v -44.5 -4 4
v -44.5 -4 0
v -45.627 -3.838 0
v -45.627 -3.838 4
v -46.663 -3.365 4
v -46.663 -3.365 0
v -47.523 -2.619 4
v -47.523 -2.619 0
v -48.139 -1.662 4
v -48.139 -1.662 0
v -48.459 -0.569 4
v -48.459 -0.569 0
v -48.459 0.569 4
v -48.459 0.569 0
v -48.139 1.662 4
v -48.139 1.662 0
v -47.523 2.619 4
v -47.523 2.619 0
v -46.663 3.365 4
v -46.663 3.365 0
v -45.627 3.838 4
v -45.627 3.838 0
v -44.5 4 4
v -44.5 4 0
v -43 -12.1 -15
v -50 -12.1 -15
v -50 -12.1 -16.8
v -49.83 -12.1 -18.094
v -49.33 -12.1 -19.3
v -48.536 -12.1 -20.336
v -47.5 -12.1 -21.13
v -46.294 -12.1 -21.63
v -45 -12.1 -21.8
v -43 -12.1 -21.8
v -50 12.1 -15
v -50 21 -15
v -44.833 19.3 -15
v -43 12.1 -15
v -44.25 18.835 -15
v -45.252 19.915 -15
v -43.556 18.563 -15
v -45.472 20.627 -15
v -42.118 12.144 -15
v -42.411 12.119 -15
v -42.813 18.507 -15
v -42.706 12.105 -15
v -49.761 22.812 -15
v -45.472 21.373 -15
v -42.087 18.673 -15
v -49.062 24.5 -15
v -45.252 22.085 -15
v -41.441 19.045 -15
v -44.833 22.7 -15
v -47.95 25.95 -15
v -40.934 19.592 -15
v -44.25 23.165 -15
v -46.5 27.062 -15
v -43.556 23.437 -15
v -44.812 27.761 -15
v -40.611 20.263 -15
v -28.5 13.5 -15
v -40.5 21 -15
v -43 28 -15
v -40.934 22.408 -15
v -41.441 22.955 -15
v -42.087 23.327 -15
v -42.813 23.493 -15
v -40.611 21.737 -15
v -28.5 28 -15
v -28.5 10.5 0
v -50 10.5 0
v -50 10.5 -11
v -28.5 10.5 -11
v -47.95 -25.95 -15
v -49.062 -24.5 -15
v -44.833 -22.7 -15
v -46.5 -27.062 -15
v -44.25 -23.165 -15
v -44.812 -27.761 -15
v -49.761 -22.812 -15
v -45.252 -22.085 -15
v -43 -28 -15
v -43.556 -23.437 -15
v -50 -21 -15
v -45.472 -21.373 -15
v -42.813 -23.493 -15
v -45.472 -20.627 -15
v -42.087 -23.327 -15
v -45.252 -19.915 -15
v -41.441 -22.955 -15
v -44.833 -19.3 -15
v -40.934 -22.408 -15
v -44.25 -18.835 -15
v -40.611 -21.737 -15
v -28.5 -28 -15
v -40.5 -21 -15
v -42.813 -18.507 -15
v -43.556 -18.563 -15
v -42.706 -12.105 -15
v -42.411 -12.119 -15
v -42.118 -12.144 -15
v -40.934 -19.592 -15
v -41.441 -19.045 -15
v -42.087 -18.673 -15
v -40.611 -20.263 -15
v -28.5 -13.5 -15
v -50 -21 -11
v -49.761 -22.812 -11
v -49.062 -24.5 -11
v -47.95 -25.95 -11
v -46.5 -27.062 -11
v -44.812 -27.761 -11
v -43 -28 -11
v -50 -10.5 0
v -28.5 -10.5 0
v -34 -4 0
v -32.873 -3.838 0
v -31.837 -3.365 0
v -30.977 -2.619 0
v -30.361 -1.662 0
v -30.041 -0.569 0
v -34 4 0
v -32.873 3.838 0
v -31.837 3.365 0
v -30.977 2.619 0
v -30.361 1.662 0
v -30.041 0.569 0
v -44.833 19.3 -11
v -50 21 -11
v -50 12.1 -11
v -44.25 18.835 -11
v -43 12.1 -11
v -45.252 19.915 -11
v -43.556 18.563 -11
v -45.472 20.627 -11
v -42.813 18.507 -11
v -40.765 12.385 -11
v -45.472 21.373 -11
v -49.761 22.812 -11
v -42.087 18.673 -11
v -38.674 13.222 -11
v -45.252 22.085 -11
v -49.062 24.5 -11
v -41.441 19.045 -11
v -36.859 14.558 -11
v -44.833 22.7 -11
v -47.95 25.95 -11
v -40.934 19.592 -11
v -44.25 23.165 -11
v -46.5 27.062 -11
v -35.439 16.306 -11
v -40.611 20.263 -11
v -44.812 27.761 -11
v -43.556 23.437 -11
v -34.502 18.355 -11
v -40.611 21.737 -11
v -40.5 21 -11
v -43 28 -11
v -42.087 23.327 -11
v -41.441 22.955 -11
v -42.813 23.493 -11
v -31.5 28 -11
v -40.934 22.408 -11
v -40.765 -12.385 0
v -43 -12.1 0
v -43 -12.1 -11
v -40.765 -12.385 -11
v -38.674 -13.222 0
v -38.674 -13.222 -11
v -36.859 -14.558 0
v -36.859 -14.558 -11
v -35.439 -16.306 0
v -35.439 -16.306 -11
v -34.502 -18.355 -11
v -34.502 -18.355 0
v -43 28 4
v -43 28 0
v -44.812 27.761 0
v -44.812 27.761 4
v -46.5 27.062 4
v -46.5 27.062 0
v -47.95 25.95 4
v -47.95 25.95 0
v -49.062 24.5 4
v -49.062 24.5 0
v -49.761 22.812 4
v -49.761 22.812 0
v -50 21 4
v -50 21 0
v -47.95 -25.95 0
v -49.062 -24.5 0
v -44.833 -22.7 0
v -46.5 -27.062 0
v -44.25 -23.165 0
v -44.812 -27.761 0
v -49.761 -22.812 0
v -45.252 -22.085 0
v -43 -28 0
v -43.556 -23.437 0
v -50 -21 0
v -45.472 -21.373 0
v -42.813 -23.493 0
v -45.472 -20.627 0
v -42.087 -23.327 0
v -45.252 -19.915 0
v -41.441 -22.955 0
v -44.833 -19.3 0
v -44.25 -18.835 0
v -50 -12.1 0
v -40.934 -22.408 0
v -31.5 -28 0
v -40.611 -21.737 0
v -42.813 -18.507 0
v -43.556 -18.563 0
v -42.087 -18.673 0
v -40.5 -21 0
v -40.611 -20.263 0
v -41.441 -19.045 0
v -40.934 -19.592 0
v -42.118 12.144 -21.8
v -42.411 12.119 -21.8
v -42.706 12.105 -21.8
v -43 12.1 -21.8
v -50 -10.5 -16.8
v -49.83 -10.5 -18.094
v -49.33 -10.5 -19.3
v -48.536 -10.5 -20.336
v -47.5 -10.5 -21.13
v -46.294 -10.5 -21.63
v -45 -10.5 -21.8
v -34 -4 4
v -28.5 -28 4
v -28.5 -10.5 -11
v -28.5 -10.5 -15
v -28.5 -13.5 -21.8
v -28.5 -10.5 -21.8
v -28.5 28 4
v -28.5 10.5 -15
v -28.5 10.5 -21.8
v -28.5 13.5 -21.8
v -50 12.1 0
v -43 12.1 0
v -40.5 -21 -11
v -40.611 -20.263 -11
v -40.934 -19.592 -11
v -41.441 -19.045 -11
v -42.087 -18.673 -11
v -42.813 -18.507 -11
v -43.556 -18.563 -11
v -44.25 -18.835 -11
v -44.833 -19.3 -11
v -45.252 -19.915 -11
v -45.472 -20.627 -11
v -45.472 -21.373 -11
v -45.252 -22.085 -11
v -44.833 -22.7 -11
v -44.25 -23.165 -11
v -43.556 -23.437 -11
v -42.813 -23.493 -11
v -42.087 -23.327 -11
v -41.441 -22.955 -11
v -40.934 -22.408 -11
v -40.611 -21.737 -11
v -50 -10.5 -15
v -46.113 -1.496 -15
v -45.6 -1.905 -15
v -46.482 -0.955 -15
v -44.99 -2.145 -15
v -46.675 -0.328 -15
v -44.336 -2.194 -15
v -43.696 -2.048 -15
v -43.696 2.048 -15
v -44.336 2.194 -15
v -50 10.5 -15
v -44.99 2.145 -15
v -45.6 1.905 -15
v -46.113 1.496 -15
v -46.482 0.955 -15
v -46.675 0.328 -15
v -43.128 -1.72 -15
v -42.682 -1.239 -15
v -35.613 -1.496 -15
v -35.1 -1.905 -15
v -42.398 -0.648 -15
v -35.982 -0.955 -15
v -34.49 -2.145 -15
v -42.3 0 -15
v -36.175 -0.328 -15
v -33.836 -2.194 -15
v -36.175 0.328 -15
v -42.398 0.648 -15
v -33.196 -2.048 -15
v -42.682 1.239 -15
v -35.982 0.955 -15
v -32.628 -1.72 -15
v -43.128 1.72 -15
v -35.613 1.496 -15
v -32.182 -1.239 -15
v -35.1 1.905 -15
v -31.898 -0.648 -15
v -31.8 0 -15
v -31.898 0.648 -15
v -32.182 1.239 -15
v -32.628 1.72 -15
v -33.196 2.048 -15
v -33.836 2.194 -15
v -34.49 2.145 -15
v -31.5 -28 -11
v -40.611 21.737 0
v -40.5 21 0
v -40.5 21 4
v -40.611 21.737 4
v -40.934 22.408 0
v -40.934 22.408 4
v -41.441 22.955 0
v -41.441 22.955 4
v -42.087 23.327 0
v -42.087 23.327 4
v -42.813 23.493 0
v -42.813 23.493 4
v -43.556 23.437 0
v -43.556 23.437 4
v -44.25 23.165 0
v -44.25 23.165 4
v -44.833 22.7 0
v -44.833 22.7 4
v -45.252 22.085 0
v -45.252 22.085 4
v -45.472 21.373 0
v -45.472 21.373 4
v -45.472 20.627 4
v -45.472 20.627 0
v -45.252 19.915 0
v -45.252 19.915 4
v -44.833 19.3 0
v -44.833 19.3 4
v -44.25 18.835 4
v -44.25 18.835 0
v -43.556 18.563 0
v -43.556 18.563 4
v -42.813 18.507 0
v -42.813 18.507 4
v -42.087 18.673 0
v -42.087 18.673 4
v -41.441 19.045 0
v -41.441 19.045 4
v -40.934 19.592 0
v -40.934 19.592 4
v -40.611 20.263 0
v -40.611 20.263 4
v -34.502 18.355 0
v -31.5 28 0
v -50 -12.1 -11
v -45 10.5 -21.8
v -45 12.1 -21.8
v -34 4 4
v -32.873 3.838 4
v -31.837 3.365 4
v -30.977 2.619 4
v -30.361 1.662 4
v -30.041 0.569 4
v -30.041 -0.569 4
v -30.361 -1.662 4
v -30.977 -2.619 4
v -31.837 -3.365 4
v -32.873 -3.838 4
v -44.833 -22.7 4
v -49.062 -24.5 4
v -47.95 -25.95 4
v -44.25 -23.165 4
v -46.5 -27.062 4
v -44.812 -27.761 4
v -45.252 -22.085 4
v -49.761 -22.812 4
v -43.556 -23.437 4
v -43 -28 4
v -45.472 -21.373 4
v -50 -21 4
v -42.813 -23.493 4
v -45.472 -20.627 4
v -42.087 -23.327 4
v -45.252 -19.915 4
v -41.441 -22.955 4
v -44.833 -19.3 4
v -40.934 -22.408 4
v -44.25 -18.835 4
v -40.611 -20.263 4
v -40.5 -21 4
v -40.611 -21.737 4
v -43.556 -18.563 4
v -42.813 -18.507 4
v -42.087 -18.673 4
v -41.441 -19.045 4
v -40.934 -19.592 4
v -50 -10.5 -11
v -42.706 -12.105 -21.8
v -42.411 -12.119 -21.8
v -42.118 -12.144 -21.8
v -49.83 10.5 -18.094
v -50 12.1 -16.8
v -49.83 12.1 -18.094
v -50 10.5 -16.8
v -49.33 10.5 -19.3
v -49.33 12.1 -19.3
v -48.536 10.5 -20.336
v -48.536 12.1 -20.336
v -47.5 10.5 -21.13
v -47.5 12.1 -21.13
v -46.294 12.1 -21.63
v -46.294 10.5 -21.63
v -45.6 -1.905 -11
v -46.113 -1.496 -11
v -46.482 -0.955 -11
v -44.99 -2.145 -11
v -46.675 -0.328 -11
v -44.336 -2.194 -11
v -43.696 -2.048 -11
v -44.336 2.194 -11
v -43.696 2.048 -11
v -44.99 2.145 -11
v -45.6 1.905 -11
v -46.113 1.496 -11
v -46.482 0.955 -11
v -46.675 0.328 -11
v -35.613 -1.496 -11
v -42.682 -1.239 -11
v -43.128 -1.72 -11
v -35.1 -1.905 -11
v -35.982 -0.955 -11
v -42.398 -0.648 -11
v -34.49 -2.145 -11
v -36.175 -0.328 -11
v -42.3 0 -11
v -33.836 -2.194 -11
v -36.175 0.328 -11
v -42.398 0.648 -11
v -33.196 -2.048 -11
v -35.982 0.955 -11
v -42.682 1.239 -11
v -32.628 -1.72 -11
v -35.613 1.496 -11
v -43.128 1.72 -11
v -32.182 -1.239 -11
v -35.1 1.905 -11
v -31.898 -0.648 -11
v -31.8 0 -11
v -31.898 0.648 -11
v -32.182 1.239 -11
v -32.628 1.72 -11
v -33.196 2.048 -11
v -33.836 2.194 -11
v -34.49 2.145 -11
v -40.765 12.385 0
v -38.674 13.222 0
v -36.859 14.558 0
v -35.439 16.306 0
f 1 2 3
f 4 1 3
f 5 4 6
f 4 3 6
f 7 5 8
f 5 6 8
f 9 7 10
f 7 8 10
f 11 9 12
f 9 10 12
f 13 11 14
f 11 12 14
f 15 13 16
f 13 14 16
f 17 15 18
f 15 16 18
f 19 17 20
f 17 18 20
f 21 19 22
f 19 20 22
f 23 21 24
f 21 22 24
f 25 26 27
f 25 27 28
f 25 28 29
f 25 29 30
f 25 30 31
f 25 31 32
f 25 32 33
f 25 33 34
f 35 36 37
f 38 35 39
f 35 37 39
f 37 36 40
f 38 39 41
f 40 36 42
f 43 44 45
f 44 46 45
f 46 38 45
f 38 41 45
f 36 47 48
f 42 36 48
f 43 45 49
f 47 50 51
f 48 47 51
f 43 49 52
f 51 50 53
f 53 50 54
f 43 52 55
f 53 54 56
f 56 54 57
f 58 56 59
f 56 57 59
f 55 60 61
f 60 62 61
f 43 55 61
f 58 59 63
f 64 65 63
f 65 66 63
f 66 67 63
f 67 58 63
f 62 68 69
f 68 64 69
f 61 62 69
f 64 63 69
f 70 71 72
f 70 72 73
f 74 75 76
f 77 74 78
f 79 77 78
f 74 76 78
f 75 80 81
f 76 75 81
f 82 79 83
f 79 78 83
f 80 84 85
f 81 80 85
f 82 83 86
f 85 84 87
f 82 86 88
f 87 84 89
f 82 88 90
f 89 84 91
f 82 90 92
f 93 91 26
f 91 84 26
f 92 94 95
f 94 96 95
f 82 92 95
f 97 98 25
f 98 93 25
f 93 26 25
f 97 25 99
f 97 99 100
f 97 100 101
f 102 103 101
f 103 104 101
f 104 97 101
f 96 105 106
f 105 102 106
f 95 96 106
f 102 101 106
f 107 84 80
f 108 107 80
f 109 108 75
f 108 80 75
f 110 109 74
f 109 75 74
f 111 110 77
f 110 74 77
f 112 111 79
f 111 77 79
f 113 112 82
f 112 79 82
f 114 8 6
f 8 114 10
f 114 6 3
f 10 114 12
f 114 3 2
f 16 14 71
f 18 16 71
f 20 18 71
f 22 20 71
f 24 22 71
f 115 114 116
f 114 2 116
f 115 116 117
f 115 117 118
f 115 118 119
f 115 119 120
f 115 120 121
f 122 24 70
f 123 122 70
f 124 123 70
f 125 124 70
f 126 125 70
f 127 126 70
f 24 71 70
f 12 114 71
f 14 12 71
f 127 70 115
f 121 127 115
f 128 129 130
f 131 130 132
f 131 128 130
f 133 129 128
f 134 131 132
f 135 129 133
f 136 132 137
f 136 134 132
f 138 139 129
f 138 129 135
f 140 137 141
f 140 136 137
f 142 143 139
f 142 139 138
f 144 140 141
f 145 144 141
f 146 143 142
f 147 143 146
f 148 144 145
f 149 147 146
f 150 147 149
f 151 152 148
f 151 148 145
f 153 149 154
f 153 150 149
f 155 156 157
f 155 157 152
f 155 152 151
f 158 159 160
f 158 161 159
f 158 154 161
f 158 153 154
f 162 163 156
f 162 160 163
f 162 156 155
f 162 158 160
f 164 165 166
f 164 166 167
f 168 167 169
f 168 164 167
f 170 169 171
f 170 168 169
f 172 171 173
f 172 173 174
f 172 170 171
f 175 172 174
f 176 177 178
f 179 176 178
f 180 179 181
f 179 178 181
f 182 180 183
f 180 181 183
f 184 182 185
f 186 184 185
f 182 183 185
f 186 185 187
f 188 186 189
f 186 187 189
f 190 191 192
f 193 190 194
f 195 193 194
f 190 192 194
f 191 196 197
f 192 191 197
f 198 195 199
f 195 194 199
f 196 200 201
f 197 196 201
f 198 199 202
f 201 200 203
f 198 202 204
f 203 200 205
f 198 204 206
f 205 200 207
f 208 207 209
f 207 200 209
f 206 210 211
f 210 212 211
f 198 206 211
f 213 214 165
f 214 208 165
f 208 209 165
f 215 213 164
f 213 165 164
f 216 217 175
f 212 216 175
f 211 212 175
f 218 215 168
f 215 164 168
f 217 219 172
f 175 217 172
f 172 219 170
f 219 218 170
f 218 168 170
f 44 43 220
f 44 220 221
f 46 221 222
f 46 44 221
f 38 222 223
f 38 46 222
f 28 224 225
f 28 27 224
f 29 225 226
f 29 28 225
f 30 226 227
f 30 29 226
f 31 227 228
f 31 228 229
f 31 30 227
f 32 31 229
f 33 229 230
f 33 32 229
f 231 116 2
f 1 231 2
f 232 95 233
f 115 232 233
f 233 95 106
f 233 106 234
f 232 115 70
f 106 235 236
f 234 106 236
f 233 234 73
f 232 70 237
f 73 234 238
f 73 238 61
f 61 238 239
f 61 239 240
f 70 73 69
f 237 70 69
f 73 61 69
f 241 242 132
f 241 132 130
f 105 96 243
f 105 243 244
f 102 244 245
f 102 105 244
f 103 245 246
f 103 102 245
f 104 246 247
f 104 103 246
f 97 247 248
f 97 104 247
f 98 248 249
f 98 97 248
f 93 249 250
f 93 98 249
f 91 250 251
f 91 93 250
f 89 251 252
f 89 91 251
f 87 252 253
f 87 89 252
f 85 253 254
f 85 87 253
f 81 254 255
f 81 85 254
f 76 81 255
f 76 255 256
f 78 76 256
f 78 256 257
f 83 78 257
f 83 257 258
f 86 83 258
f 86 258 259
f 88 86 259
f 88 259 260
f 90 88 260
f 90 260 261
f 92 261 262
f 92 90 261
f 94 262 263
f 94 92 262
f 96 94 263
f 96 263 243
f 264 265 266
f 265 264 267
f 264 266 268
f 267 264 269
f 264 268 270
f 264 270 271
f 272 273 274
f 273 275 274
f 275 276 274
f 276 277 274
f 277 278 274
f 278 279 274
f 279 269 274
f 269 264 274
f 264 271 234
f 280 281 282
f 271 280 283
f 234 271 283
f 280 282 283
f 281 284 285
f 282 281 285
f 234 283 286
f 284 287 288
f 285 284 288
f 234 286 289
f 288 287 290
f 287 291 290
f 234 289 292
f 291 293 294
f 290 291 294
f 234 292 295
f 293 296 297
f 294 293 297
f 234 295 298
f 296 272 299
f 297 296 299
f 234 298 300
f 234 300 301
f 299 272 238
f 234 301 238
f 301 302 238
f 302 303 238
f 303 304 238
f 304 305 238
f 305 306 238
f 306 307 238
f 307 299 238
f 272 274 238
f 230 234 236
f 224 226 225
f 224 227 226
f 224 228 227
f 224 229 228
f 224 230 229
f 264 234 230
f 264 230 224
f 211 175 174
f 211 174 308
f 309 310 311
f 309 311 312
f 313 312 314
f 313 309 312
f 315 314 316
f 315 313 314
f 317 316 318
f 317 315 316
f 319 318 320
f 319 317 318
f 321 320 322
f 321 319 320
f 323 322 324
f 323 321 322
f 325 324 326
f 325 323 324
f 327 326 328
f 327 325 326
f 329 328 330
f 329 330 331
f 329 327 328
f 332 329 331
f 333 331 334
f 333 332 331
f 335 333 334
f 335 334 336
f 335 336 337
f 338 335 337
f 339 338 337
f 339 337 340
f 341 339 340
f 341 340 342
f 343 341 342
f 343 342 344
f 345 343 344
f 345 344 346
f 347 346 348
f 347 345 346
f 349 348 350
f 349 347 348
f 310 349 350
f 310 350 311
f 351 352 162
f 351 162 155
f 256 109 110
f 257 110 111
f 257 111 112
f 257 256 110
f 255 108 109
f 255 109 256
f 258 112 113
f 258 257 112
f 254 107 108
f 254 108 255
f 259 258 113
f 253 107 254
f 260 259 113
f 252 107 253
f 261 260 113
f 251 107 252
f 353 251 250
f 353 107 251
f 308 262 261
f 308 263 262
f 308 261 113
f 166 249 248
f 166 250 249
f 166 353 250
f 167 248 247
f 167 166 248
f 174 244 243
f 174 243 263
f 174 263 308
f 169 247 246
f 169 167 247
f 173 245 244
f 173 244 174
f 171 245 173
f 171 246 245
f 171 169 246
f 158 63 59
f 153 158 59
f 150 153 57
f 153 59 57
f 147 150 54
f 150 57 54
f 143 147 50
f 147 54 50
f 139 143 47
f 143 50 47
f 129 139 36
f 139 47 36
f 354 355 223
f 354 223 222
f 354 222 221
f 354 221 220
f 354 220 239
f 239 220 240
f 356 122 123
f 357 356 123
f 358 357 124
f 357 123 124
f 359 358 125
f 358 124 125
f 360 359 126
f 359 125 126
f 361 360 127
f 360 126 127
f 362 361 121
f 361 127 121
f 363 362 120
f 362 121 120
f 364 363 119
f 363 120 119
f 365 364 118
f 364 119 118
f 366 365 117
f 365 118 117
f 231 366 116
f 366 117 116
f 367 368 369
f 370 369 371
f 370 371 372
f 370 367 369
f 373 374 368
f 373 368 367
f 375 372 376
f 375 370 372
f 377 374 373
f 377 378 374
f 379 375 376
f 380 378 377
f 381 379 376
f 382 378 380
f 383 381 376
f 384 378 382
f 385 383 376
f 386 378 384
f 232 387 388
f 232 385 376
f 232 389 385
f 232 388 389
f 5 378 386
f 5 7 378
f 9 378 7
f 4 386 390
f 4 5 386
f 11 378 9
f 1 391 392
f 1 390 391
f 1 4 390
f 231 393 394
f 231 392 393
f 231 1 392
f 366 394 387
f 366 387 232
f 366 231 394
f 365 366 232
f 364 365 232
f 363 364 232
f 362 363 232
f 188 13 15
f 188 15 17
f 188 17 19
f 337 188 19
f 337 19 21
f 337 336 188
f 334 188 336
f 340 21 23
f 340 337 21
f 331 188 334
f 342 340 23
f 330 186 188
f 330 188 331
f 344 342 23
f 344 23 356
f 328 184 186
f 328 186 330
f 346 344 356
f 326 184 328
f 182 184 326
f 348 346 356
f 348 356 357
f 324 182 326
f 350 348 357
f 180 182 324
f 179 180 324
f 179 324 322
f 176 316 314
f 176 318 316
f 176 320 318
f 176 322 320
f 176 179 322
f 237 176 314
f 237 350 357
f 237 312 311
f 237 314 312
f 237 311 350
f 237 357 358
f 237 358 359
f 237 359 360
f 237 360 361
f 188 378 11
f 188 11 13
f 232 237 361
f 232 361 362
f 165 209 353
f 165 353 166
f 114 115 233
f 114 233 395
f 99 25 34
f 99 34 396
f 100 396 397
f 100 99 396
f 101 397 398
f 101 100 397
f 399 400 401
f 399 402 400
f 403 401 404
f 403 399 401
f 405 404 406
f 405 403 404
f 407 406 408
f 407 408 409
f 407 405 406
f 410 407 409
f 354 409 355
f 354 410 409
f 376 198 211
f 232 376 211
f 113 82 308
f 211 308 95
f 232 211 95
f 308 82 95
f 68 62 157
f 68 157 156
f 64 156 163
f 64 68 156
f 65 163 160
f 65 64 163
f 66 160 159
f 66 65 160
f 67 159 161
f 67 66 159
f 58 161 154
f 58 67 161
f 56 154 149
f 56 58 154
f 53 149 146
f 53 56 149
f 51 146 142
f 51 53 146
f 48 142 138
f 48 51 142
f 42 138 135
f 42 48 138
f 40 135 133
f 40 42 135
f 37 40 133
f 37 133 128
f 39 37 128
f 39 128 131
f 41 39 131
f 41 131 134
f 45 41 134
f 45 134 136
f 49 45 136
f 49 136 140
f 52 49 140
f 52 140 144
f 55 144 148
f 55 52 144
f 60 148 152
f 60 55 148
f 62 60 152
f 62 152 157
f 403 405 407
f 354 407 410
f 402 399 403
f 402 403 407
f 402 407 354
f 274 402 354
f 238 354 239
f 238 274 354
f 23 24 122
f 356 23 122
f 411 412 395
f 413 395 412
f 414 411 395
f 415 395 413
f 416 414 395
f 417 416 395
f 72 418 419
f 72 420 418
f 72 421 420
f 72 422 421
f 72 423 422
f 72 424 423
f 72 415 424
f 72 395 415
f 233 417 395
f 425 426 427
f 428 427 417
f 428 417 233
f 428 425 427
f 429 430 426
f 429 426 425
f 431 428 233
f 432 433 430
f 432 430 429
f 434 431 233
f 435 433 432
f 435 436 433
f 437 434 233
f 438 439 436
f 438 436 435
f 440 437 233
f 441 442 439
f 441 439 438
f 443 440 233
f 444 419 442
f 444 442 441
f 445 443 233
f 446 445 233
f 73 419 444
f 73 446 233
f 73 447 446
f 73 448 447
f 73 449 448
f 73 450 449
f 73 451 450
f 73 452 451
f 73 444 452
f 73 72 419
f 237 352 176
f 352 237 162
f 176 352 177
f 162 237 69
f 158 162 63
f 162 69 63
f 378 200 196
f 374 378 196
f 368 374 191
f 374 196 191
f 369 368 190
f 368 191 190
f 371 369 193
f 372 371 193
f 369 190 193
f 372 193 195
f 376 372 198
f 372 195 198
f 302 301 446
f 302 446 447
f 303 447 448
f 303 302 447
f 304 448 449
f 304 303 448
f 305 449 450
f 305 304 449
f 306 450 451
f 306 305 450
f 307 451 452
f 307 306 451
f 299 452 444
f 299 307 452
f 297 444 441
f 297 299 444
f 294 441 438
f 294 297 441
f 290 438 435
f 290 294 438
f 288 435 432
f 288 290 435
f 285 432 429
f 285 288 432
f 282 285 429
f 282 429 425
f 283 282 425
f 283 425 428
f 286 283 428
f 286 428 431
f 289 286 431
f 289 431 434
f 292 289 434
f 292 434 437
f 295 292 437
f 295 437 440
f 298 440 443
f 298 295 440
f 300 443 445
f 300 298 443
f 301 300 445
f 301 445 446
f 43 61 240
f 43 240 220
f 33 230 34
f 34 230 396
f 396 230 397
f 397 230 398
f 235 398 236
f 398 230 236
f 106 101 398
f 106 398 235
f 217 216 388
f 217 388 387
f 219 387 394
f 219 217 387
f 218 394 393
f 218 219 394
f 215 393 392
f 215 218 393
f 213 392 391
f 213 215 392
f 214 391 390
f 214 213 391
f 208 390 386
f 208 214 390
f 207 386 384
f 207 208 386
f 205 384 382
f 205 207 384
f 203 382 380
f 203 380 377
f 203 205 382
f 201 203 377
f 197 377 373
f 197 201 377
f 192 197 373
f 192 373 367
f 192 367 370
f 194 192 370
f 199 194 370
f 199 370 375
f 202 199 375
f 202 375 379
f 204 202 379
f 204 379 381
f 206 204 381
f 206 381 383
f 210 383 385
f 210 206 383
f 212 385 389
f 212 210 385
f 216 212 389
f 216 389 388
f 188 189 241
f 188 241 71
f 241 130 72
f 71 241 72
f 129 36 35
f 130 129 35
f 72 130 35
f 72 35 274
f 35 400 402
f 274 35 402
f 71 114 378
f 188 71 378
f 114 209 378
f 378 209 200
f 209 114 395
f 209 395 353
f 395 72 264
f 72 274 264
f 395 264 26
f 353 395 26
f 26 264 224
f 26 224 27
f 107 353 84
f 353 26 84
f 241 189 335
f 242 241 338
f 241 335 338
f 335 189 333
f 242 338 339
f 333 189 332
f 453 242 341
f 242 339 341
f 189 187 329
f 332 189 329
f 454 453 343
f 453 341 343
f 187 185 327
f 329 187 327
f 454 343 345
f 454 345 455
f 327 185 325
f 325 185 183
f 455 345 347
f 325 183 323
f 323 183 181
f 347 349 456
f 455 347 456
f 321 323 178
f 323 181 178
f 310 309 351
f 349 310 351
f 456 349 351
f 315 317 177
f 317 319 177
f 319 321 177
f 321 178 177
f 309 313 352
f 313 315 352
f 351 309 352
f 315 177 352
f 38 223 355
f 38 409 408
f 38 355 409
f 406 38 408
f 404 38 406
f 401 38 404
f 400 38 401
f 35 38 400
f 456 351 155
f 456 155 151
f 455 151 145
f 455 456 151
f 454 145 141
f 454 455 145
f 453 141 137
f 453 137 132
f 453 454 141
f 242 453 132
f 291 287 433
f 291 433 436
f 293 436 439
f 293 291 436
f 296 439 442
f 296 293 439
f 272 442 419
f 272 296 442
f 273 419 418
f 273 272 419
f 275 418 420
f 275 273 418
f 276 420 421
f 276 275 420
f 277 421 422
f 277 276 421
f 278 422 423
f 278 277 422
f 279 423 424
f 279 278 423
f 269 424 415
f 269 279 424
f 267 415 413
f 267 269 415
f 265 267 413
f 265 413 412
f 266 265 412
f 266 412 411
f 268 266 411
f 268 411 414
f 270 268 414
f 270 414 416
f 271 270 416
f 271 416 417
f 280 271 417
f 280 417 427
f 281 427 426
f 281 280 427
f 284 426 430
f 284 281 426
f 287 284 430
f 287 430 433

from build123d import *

# Parameters (mm, degrees)
SKETCH_1_R      = 2.5
EXTRUDE_1_DEPTH = 4
EXTRUDE_2_DEPTH = 11
EXTRUDE_START   = -15
SKETCH_1_6_R    = 2.5
SKETCH_1_6_R_2  = 2.2
EXTRUDE_3_DEPTH = 4
EXTRUDE_4_DEPTH = 6.8
FILLET_1_R      = 5


with BuildPart() as part:
    # 草图1 → 凸台-拉伸1 (new body)
    with BuildSketch(Plane.XY):
        with BuildLine():
            ThreePointArc((-43, 28), (-47.949747468, 25.949747468), (-50, 21))
            Line((-50, 21), (-50, -21))
            ThreePointArc((-50, -21), (-47.949747468, -25.949747468), (-43, -28))
            Line((-43, -28), (-28.5, -28))
            Line((-28.5, -28), (-28.5, 28))
            Line((-28.5, 28), (-43, 28))
        make_face()
        with Locations((-43, 21)):
            Circle(SKETCH_1_R, mode=Mode.SUBTRACT)
        with BuildLine():
            Line((-44.5, 4), (-34, 4))
            ThreePointArc((-34, 4), (-30, 0), (-34, -4))
            Line((-34, -4), (-44.5, -4))
            ThreePointArc((-44.5, -4), (-48.5, 0), (-44.5, 4))
        make_face(mode=Mode.SUBTRACT)
        with Locations((-43, -21)):
            Circle(SKETCH_1_R, mode=Mode.SUBTRACT)
    extrude(amount=EXTRUDE_1_DEPTH)

    # 草图1<5> → 凸台-拉伸2 (add)
    with BuildSketch(Plane.XY):
        with BuildLine():
            Line((-43, 12.1), (-50, 12.1))
            Line((-50, 12.1), (-50, 10.5))
            Line((-50, 10.5), (-28.5, 10.5))
            Line((-28.5, 10.5), (-28.5, 28))
            Line((-28.5, 28), (-31.5, 28))
            Line((-31.5, 28), (-34.502137832, 18.354940724))
            ThreePointArc((-34.502137832, 18.354940724), (-37.724160141, 13.832328567), (-43, 12.1))
        make_face()
        with BuildLine():
            Line((-28.5, -10.5), (-50, -10.5))
            Line((-50, -10.5), (-50, -12.1))
            Line((-50, -12.1), (-43, -12.1))
            ThreePointArc((-43, -12.1), (-37.724160141, -13.832328567), (-34.502137832, -18.354940724))
            Line((-34.502137832, -18.354940724), (-31.5, -28))
            Line((-31.5, -28), (-28.5, -28))
            Line((-28.5, -28), (-28.5, -10.5))
        make_face()
    extrude(amount=-EXTRUDE_2_DEPTH)

    # 草图1<6> → 凸台-拉伸3 (add)
    with BuildSketch(Plane.XY.offset(EXTRUDE_START)):
        with BuildLine():
            ThreePointArc((-43, 28), (-47.949747468, 25.949747468), (-50, 21))
            Line((-50, 21), (-50, -21))
            ThreePointArc((-50, -21), (-47.949747468, -25.949747468), (-43, -28))
            Line((-43, -28), (-28.5, -28))
            Line((-28.5, -28), (-28.5, 28))
            Line((-28.5, 28), (-43, 28))
        make_face()
        with Locations((-43, 21)):
            Circle(SKETCH_1_6_R, mode=Mode.SUBTRACT)
        with Locations((-43, -21)):
            Circle(SKETCH_1_6_R, mode=Mode.SUBTRACT)
        with Locations((-34, 0)):
            Circle(SKETCH_1_6_R_2, mode=Mode.SUBTRACT)
        with Locations((-44.5, 0)):
            Circle(SKETCH_1_6_R_2, mode=Mode.SUBTRACT)
    extrude(amount=EXTRUDE_3_DEPTH)

    # 草图1<7> → 凸台-拉伸4 (add)
    with BuildSketch(Plane.XY.offset(EXTRUDE_START)):
        with BuildLine():
            Line((-43, 12.1), (-50, 12.1))
            Line((-50, 12.1), (-50, 10.5))
            Line((-50, 10.5), (-28.5, 10.5))
            Line((-28.5, 10.5), (-28.5, 13.5))
            Line((-28.5, 13.5), (-42.118030123, 12.143808429))
            ThreePointArc((-42.118030123, 12.143808429), (-42.558471393, 12.110958854), (-43, 12.1))
        make_face()
        with BuildLine():
            Line((-28.5, -10.5), (-50, -10.5))
            Line((-50, -10.5), (-50, -12.1))
            Line((-50, -12.1), (-43, -12.1))
            ThreePointArc((-43, -12.1), (-42.558471393, -12.110958854), (-42.118030123, -12.143808429))
            Line((-42.118030123, -12.143808429), (-28.5, -13.5))
            Line((-28.5, -13.5), (-28.5, -10.5))
        make_face()
    extrude(amount=-EXTRUDE_4_DEPTH)

    # 圆角1
    fillet_1_edges = [part.edges().sort_by_distance(p)[0] for p in [
        (-50, 11.3, -21.8),
        (-50, -11.3, -21.8),
    ]]
    fillet(fillet_1_edges, radius=FILLET_1_R)


solid = part.part
